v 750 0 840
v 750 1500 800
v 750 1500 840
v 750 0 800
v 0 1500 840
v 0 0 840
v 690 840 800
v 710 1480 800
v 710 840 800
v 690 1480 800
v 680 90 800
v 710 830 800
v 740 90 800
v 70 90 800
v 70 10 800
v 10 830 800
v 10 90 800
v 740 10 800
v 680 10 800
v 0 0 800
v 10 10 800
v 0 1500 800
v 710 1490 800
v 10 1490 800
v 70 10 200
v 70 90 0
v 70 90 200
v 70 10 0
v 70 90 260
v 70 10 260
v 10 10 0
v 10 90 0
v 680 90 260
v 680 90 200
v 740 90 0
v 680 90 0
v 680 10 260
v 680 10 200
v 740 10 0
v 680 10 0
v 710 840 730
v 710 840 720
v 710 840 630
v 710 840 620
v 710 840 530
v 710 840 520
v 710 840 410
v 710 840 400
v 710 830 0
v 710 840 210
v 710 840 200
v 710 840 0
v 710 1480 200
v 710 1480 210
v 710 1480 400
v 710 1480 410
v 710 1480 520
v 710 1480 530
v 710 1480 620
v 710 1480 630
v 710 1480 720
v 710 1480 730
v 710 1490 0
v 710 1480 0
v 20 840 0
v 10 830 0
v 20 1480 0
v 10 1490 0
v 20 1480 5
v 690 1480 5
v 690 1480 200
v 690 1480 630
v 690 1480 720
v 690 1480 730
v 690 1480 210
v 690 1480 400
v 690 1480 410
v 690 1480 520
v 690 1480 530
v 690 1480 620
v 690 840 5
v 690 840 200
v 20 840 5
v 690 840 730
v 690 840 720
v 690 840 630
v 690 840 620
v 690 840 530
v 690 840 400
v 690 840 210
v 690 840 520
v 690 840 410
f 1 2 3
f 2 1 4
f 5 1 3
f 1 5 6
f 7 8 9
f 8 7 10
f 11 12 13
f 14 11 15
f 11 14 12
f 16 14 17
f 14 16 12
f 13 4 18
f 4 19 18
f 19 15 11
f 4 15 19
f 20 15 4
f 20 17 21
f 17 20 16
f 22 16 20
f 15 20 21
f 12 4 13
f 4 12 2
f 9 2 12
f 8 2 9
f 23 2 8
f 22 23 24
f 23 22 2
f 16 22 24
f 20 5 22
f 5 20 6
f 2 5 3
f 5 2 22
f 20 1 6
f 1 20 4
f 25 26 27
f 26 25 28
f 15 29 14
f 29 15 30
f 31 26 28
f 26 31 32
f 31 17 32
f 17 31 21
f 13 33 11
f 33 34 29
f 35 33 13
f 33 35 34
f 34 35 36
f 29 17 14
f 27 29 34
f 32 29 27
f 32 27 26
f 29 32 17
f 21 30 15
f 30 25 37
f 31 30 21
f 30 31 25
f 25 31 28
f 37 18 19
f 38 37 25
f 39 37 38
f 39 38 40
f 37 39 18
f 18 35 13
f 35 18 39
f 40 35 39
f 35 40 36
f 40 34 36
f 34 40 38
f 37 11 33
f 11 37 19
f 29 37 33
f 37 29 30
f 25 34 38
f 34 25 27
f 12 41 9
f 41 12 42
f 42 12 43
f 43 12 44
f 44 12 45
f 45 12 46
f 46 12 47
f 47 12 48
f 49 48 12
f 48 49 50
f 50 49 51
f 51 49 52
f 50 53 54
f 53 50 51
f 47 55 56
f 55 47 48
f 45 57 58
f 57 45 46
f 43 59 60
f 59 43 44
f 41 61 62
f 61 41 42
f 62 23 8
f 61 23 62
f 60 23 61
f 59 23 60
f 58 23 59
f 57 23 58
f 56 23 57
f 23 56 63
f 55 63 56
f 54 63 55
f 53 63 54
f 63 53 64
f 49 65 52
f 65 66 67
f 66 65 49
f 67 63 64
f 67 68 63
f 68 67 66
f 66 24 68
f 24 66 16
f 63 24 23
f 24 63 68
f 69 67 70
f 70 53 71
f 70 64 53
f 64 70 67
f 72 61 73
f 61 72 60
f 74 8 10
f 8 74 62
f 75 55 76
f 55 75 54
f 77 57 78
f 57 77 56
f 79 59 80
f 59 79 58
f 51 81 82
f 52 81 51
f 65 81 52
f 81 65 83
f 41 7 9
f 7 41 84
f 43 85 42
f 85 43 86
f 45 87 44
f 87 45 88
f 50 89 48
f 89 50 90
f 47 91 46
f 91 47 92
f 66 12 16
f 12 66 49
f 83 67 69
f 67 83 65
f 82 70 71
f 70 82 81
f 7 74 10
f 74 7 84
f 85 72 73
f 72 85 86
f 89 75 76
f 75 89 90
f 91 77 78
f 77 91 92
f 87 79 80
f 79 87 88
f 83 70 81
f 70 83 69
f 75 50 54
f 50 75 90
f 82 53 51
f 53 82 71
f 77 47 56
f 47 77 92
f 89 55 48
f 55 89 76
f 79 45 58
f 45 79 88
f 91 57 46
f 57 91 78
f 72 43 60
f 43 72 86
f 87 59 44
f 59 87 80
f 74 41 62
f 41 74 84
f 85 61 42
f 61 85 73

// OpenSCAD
// top
translate([0, 0, 840-40])
    color("Burlywood")
    cube([750, 1500 , 40]);

// legs
translate([10, 10, 0])
    color("White")
    cube([60, 80 , 810]);
    
translate([680, 10, 0])
    color("White")
    cube([60, 80 , 810]);
    
translate([10, 10, 200])
    color("White")
    cube([700, 80 , 60]);
    
// drawers

translate([10, 1480, 0])
    color("White")
    cube([700, 10, 810]);
    
translate([10, 1480-650, 0])
    color("White")
    cube([700, 10, 810]);
    
translate([10, 1480-650, 0])
    color("White")
    cube([10, 660, 810]);
    
translate([20, 1480-640, 5])
    color("Blue")
    cube([670, 645, 810]);
    
translate([10, 1480-650, 200])
    color("White")
    cube([700, 660, 10]);
    
translate([10, 1480-650, 400])
    color("White")
    cube([700, 660, 10]);
    
translate([10, 1480-650, 520])
    color("White")
    cube([700, 660, 10]);
    
translate([10, 1480-650, 620])
    color("White")
    cube([700, 660, 10]);
    
translate([10, 1480-650, 720])
    color("White")
    cube([700, 660, 10]);
